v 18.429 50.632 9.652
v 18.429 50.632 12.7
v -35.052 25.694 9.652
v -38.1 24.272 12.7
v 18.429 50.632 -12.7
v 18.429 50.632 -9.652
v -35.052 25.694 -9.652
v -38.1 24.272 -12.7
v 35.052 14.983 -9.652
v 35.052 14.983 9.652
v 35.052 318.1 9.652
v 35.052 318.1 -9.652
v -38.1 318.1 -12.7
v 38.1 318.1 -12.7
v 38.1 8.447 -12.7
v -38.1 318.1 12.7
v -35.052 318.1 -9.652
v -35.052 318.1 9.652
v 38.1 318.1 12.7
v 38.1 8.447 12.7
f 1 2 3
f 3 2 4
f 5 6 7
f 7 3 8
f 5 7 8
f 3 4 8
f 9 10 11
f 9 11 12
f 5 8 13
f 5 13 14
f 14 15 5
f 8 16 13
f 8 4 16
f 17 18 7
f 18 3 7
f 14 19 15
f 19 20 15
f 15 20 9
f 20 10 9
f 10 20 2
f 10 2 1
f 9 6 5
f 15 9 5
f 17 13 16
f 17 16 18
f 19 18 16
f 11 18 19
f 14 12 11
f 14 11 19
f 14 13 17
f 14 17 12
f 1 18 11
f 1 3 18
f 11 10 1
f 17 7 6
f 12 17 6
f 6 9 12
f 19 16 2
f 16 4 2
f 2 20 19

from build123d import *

# Parameters (mm, degrees)
SKETCH1_W           = 76.2
SKETCH1_H           = 25.4
SKETCH1_W_2         = 70.104
SKETCH1_H_2         = 19.304
BOSS_EXTRUDE1_DEPTH = 280
CUT_EXTRUDE1_START  = -34.530327
SKETCH3_W           = 25.4
SKETCH3_H           = 76.2
CUT_EXTRUDE1_DEPTH  = 72.630327
SKETCH5_W           = 76.2
SKETCH5_H           = 25.4
SKETCH5_W_2         = 70.104
SKETCH5_H_2         = 19.304
BOSS_EXTRUDE2_DEPTH = 38.1


with BuildPart() as part:
    # Sketch1 → Boss-Extrude1 (new body)
    with BuildSketch(Plane(origin=(0, 0, 0), x_dir=(1, 0, 0), z_dir=(0, 1, 0))):
        Rectangle(SKETCH1_W, SKETCH1_H)
        Rectangle(SKETCH1_W_2, SKETCH1_H_2, mode=Mode.SUBTRACT)
    extrude(amount=BOSS_EXTRUDE1_DEPTH)

    # Sketch3 → Cut-Extrude1 (cut)
    with BuildSketch(Plane(origin=(0, 0, 0), x_dir=(0, 0, -1), z_dir=(0.906307787, 0.422618262, 0)).offset(CUT_EXTRUDE1_START)):
        Rectangle(SKETCH3_W, SKETCH3_H)
    extrude(amount=CUT_EXTRUDE1_DEPTH, mode=Mode.SUBTRACT)

    # Sketch5 → Boss-Extrude2 (add)
    with BuildSketch(Plane(origin=(0, 280, 0), x_dir=(1, 0, 0), z_dir=(0, 1, 0))):
        Rectangle(SKETCH5_W, SKETCH5_H)
        Rectangle(SKETCH5_W_2, SKETCH5_H_2, mode=Mode.SUBTRACT)
    extrude(amount=BOSS_EXTRUDE2_DEPTH)


solid = part.part
